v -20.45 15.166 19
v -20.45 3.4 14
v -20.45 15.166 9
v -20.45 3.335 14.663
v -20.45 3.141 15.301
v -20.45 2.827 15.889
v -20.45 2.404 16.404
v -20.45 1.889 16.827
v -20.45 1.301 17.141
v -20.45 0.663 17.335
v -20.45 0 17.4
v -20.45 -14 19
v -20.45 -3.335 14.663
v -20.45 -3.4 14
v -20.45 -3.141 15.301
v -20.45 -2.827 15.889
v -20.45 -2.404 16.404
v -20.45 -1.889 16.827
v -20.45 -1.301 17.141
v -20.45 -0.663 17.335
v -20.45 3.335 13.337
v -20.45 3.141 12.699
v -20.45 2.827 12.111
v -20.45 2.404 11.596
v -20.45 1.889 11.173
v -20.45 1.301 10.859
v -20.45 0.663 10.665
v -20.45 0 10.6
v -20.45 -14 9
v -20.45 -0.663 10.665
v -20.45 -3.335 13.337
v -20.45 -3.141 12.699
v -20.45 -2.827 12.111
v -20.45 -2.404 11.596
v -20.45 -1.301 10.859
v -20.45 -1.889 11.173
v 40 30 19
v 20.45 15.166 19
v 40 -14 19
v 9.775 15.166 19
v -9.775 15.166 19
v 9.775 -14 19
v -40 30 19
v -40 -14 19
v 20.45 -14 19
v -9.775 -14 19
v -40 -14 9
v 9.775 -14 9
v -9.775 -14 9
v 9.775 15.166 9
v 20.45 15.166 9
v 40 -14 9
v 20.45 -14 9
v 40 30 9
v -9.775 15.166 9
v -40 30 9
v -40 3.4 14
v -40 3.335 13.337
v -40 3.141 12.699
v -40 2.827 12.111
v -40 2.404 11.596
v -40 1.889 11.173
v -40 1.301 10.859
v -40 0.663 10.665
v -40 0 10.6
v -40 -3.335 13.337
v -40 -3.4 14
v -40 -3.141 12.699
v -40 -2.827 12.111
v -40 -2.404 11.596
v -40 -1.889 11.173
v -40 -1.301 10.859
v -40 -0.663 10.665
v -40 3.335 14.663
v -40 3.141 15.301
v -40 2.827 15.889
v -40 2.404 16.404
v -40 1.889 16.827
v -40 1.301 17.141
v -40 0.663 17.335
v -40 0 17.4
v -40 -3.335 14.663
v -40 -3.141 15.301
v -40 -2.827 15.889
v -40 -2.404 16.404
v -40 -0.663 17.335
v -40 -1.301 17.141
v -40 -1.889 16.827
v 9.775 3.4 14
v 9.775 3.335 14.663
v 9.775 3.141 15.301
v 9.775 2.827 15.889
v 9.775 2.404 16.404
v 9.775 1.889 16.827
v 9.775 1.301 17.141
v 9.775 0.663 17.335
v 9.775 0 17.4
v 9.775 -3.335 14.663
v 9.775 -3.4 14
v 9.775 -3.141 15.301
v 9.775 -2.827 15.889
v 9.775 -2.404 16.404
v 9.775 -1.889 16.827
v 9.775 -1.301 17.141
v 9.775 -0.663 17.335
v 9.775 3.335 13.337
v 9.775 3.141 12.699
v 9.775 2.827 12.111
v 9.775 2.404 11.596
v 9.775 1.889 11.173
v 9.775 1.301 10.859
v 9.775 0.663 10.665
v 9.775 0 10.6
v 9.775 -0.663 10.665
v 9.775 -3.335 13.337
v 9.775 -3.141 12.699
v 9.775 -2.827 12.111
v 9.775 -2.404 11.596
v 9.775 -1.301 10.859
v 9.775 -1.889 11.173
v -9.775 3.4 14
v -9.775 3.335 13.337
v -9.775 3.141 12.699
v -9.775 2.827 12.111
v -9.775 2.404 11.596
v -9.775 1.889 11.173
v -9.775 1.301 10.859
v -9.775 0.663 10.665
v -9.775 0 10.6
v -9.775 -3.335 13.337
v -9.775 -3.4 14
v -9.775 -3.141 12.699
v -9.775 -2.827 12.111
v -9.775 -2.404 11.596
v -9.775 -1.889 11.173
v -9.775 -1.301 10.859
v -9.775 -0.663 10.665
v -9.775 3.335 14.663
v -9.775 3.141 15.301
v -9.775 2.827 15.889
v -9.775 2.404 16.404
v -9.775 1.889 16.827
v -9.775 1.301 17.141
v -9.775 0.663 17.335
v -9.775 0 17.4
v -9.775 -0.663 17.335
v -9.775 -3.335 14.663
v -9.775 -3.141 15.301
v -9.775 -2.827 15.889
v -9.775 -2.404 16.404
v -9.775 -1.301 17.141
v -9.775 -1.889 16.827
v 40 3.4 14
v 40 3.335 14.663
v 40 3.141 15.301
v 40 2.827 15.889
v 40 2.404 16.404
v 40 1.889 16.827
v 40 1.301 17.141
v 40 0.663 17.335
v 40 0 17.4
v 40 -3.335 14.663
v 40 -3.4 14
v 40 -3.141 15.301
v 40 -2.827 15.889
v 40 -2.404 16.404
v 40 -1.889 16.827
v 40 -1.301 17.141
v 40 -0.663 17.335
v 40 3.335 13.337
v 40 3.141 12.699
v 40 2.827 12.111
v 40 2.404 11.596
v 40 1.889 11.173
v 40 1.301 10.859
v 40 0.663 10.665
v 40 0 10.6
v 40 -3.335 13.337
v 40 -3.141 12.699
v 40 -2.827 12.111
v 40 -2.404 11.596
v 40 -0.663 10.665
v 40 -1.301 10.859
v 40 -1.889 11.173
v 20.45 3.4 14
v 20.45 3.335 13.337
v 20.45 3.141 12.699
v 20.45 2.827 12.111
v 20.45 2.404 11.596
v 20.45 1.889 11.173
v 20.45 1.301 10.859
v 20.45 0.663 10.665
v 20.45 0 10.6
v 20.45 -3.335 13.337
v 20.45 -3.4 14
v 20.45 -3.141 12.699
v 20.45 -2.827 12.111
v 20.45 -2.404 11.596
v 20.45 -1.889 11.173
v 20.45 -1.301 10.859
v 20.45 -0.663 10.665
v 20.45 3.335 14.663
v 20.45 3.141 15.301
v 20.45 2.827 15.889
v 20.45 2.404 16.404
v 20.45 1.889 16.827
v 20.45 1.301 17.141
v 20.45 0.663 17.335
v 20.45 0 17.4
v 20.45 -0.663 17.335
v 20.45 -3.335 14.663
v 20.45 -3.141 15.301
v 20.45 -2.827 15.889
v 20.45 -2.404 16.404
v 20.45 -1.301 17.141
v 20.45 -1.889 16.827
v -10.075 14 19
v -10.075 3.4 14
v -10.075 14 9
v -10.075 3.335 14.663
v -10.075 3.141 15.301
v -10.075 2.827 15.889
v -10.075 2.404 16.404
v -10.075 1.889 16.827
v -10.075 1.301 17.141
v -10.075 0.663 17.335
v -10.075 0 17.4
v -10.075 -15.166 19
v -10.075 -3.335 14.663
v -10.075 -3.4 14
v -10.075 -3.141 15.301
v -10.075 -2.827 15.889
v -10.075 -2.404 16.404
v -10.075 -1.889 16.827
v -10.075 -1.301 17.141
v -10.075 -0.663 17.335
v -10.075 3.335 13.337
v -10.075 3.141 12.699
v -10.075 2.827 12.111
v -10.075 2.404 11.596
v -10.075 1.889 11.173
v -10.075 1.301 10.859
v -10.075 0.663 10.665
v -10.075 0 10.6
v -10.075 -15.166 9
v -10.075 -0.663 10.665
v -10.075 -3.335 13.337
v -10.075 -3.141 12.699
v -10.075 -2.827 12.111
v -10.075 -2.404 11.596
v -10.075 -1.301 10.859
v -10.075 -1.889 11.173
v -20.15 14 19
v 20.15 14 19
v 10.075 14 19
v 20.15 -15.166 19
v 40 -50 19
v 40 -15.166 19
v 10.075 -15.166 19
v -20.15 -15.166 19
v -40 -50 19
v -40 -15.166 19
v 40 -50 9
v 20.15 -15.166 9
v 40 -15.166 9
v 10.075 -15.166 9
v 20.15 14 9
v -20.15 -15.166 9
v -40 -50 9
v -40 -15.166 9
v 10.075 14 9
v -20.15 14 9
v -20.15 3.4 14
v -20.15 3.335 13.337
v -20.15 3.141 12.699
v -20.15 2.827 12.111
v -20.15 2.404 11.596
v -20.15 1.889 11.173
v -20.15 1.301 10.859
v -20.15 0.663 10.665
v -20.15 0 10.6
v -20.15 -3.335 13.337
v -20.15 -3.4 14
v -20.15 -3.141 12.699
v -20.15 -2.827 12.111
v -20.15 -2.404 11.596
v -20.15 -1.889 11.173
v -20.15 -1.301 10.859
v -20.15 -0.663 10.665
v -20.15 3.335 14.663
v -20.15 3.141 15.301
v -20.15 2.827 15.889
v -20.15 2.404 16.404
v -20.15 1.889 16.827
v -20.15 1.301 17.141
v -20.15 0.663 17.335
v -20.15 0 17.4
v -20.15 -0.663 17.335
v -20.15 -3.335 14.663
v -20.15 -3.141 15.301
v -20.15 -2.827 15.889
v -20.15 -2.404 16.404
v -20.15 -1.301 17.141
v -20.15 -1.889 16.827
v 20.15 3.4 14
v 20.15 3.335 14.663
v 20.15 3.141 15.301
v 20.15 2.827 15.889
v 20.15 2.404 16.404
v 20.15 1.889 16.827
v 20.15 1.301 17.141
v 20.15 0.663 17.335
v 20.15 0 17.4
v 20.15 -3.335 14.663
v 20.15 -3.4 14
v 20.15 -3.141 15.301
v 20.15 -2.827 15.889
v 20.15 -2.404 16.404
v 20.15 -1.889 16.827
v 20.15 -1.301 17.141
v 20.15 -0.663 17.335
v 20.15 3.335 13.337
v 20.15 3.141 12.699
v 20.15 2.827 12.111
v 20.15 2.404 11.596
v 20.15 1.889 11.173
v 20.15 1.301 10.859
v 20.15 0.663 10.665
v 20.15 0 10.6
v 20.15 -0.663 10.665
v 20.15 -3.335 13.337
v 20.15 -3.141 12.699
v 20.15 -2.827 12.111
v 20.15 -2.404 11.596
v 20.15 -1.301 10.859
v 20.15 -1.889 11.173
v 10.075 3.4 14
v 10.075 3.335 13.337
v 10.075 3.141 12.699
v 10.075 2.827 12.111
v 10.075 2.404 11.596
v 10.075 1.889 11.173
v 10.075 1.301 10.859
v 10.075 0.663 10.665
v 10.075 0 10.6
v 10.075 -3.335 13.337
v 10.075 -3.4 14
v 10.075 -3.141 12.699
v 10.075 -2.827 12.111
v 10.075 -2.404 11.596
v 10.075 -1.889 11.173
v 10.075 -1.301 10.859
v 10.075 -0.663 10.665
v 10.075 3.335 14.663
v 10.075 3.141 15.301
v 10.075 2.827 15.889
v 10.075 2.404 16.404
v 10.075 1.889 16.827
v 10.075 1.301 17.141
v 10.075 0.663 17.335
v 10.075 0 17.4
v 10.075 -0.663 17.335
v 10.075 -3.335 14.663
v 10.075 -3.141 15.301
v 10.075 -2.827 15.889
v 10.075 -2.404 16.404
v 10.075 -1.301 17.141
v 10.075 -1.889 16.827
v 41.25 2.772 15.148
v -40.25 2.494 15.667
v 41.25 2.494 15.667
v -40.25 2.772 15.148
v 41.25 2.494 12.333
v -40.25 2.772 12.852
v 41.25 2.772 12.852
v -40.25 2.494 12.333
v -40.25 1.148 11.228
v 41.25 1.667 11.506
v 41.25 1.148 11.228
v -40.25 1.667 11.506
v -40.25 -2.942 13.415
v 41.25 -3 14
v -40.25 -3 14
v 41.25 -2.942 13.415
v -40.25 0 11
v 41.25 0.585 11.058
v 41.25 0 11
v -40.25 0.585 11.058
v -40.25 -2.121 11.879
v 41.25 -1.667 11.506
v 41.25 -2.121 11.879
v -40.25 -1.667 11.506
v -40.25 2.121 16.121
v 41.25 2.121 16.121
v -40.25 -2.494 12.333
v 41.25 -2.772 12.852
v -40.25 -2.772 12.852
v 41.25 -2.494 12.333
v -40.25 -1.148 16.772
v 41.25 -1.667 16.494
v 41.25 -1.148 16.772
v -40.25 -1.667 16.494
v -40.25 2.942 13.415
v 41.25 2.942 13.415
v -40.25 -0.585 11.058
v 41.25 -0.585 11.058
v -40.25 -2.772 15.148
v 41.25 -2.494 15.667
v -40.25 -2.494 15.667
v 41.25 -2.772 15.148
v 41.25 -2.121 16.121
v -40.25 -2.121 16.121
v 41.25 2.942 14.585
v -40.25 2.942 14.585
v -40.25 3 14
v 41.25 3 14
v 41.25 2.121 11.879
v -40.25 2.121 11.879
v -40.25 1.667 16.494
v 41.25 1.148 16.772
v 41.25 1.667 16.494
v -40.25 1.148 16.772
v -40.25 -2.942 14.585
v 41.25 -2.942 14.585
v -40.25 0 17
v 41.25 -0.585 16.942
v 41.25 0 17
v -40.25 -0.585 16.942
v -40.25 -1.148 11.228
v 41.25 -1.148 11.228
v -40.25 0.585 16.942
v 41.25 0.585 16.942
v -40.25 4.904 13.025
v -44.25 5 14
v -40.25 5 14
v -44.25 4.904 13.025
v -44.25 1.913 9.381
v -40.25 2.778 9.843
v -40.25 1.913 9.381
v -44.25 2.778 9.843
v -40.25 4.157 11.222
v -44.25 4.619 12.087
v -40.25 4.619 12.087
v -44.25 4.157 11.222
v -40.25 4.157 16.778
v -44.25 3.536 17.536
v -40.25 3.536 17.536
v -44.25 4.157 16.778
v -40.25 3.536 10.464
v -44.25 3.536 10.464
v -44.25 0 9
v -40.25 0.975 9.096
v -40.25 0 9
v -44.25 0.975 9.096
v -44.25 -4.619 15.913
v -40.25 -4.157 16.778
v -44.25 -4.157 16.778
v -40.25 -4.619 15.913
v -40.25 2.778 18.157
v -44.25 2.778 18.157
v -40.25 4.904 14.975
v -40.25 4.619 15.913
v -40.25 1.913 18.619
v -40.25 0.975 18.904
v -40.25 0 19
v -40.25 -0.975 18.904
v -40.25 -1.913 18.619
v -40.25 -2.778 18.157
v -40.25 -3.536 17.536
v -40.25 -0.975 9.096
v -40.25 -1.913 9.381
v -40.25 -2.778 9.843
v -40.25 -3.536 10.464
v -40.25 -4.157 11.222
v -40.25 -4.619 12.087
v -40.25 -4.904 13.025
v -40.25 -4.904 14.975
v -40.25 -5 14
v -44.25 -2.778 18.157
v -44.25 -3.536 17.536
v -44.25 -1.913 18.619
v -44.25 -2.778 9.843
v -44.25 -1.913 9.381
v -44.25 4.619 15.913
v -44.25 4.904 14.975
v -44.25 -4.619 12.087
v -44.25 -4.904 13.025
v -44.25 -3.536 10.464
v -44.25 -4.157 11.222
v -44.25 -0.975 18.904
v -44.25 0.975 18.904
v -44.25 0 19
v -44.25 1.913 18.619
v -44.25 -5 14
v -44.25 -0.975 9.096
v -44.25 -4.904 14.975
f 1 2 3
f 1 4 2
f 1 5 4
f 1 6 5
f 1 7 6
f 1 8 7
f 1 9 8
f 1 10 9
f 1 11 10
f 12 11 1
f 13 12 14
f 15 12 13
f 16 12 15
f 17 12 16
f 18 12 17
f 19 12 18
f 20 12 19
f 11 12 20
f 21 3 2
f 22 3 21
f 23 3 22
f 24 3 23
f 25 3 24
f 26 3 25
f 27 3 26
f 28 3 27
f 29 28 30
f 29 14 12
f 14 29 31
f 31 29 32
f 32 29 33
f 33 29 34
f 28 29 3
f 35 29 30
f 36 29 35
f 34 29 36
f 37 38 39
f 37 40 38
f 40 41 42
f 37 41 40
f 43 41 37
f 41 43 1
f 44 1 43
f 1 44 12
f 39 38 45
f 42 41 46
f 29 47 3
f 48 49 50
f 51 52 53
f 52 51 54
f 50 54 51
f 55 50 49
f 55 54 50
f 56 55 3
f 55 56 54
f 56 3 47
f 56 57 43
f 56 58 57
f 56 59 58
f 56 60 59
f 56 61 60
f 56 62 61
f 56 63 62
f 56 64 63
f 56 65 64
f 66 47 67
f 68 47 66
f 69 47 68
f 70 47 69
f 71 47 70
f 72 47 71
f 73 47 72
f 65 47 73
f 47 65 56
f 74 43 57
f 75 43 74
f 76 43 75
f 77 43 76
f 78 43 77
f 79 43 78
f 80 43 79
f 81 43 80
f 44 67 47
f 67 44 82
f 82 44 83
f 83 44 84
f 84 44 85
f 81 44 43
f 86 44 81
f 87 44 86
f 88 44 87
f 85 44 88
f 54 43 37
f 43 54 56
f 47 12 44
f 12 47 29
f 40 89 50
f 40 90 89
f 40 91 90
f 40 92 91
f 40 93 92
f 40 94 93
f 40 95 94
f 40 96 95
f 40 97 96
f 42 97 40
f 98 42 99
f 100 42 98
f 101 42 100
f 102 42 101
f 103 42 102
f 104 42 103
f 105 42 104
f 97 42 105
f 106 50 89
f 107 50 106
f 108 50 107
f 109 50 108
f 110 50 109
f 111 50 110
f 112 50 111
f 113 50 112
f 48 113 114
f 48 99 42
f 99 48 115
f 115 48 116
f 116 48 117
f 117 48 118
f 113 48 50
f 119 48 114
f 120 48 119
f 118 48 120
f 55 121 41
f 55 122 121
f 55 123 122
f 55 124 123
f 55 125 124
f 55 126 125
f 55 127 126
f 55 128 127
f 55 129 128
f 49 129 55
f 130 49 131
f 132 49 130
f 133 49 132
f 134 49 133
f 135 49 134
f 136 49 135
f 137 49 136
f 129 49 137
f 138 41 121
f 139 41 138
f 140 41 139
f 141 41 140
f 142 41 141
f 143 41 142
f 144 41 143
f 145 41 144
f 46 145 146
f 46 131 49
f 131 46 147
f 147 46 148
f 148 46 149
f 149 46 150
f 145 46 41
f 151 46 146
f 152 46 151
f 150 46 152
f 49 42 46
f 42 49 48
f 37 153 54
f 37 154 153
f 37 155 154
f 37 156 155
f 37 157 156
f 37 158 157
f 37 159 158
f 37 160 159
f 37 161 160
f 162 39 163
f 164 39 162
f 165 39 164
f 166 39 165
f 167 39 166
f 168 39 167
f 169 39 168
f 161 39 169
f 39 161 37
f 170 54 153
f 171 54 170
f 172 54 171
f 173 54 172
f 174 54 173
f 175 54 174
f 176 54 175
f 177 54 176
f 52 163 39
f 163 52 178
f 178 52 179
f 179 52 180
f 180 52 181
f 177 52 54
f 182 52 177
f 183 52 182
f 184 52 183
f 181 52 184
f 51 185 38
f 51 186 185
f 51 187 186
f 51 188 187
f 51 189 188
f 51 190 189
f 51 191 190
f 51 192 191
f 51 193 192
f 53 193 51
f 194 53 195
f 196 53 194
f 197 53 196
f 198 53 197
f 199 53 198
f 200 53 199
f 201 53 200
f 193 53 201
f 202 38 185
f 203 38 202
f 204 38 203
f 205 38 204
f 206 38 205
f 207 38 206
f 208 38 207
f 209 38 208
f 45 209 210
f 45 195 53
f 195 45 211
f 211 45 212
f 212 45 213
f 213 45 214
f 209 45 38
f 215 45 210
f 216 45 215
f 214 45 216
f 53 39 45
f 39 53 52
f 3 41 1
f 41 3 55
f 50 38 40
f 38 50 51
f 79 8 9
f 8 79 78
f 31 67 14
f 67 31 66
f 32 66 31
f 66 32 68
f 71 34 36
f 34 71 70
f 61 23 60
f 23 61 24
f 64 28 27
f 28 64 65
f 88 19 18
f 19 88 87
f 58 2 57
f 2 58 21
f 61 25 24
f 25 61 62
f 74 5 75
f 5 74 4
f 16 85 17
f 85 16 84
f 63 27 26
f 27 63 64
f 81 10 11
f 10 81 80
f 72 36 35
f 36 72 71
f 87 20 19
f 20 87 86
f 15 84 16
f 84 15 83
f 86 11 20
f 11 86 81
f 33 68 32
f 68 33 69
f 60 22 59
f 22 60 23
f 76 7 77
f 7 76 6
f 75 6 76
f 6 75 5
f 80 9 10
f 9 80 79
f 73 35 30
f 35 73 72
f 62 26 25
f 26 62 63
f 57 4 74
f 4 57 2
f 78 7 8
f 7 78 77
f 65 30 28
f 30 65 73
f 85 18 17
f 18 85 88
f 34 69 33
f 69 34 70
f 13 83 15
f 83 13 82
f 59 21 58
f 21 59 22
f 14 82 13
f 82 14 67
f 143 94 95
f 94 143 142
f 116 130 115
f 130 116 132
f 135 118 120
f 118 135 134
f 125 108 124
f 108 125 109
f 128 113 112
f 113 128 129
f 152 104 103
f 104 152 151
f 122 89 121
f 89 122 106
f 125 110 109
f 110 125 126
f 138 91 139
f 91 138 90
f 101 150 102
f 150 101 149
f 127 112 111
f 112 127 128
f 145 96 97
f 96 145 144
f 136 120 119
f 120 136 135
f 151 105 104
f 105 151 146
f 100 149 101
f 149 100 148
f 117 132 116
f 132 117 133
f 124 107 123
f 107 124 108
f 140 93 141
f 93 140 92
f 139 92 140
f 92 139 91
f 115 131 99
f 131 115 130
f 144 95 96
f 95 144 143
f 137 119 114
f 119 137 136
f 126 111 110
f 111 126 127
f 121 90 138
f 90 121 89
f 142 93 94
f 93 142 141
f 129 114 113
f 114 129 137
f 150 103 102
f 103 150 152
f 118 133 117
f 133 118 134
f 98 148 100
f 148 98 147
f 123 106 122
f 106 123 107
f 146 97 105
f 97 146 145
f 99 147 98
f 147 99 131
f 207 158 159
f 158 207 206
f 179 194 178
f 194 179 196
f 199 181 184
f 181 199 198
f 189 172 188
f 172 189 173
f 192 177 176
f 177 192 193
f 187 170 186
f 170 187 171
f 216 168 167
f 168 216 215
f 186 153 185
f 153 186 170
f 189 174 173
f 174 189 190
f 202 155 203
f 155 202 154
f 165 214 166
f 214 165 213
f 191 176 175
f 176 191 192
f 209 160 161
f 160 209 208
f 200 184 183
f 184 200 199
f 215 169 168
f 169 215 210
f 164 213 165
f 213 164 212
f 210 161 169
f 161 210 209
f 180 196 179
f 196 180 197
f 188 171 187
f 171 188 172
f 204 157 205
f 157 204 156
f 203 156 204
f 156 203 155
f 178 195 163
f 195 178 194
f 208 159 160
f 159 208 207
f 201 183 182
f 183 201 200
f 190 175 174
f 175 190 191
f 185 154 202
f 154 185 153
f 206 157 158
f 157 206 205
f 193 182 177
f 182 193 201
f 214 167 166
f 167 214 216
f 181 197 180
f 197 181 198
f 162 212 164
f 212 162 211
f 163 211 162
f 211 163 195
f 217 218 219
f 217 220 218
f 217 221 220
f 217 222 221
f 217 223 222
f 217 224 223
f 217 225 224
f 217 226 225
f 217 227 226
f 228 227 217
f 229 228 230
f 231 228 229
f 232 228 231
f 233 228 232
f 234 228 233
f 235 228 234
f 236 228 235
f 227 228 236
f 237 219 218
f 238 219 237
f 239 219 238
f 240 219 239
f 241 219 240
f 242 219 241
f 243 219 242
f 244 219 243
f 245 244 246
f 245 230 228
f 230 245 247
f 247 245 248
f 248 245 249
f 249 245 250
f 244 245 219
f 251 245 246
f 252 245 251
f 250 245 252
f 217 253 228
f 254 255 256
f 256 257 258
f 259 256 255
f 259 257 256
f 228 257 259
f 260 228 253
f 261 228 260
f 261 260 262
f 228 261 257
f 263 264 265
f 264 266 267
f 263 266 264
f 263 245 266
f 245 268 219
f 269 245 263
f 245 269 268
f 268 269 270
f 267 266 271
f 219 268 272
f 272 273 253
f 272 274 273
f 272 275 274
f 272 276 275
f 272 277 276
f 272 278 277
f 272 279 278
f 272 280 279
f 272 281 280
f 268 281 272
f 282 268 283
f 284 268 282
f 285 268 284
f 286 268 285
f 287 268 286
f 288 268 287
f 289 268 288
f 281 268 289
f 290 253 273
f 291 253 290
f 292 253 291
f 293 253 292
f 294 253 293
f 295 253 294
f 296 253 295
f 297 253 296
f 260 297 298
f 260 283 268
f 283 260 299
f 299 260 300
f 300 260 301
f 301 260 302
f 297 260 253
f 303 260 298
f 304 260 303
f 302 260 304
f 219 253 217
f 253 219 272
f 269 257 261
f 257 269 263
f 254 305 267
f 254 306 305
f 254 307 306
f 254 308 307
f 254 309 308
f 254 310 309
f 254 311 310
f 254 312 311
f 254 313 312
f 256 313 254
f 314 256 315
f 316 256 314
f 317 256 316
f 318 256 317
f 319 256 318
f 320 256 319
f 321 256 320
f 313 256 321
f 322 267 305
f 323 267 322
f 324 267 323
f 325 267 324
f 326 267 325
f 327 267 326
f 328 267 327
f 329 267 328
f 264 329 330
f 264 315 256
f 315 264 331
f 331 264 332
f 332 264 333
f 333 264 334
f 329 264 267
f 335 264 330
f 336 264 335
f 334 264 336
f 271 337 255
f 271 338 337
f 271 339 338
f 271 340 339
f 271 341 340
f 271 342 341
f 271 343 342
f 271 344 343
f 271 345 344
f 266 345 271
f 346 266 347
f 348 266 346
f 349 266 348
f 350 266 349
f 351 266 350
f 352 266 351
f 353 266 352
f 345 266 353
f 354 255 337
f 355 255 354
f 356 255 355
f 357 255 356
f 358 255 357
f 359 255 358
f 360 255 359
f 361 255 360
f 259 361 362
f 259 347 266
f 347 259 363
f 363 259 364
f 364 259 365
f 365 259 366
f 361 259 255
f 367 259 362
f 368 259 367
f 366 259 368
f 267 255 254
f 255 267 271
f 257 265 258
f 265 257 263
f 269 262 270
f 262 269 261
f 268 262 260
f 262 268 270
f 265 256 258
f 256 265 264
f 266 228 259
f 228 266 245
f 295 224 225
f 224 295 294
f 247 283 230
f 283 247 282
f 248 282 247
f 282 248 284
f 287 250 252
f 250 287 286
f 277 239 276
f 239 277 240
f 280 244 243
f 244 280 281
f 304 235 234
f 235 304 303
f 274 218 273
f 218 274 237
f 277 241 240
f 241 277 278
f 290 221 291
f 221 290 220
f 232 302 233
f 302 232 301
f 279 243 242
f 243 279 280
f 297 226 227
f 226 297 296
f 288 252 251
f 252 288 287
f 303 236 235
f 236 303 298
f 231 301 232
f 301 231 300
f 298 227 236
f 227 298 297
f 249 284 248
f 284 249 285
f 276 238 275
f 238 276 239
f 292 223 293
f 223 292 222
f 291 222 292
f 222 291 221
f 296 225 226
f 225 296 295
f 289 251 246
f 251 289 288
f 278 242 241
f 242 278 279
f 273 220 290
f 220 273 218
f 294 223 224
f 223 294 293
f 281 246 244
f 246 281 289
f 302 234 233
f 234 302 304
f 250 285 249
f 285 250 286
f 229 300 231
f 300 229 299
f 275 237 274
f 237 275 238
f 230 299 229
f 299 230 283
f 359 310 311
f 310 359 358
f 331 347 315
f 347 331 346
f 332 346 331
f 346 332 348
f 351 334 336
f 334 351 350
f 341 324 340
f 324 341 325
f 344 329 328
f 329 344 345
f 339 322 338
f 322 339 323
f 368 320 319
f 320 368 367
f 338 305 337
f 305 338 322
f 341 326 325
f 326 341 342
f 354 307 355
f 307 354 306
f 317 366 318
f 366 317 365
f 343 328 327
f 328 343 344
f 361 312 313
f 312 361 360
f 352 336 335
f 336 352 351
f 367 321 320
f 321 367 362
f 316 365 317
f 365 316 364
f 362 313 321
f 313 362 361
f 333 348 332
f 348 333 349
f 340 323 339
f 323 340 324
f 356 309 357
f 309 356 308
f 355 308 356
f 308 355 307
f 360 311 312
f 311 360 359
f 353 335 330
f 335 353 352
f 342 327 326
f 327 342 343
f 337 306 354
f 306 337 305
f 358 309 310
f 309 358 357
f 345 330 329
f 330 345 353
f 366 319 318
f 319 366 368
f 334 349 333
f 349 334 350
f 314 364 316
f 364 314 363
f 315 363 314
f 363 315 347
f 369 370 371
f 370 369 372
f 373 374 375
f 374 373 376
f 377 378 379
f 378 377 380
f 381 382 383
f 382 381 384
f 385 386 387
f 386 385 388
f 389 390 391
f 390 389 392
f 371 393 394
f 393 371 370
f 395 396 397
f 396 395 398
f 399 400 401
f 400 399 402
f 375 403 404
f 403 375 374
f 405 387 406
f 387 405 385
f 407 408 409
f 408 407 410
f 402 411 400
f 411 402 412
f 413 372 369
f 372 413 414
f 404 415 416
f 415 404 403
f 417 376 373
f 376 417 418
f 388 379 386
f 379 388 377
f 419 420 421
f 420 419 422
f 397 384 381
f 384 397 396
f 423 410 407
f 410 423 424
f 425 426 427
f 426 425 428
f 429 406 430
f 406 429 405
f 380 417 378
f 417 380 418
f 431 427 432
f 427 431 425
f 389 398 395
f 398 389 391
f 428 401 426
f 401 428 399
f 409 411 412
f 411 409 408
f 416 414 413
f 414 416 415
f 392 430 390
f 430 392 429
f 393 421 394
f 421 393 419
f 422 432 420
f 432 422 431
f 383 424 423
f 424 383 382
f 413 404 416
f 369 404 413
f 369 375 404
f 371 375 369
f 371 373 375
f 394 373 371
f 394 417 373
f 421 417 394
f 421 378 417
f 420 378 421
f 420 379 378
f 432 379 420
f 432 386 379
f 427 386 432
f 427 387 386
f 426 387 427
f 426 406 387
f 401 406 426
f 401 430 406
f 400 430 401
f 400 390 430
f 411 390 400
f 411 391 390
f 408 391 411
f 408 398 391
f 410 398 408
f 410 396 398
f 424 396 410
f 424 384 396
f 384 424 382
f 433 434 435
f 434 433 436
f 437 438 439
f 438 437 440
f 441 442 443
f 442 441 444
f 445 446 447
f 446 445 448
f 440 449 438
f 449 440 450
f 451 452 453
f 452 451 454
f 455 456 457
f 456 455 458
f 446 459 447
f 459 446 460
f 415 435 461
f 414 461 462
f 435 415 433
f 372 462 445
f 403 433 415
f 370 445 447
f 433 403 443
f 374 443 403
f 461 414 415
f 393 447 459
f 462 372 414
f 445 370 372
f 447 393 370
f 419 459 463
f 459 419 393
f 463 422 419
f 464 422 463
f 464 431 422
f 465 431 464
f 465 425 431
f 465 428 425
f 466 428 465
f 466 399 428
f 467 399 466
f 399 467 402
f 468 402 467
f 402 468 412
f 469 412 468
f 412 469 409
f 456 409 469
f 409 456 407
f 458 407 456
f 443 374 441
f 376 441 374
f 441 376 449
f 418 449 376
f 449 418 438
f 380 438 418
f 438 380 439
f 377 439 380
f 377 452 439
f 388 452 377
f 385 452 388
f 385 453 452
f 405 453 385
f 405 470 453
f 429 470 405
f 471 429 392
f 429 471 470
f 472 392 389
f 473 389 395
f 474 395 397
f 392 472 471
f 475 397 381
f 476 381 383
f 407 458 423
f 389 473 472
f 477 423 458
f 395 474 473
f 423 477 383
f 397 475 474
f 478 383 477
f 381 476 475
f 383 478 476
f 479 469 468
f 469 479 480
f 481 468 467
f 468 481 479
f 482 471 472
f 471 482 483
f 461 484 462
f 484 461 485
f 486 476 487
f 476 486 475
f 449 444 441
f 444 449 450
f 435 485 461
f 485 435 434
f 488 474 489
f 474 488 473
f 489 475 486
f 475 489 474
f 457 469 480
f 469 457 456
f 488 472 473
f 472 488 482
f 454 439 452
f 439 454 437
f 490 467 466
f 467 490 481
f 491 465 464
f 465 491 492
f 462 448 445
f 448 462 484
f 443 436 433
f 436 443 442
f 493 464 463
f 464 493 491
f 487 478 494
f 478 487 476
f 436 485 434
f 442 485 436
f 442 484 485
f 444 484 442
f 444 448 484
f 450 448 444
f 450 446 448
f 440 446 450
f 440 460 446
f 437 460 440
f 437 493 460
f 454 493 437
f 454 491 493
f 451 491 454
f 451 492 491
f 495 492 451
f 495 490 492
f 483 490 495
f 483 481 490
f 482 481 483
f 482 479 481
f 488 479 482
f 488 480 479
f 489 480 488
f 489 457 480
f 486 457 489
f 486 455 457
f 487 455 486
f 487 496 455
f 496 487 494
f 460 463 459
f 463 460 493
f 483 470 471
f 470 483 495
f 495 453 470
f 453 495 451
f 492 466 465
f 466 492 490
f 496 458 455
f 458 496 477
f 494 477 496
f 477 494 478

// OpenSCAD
$fn = 32;

// ------------------------------------------------------------------------
// Butt hinge: hinge 80 mm, leaf swung 0 deg
// Every part is its own module, assembly() places every instance.
// ------------------------------------------------------------------------

// --- part 1 ---
module hinge_base() {
  difference() {
    union() {
      translate([-40, -14, -5]) cube([19.55, 44, 10]);
      translate([-9.775, -14, -5]) cube([19.55, 44, 10]);
      translate([20.45, -14, -5]) cube([19.55, 44, 10]);
      translate([-40, 15.166, -5]) cube([80, 14.834, 10]);
    }
    translate([-30.225, 0, 0]) rotate([0, 90, 0]) cylinder(h = 21.55, d = 6.8, center = true);
    translate([0, 0, 0]) rotate([0, 90, 0]) cylinder(h = 21.55, d = 6.8, center = true);
    translate([30.225, 0, 0]) rotate([0, 90, 0]) cylinder(h = 21.55, d = 6.8, center = true);
  }
}

// --- part 2 ---
module hinge_mover() {
  difference() {
    union() {
      translate([-20.15, -50, -5]) cube([10.075, 64, 10]);
      translate([10.075, -50, -5]) cube([10.075, 64, 10]);
      translate([-40, -50, -5]) cube([80, 34.834, 10]);
    }
    translate([-15.113, 0, 0]) rotate([0, 90, 0]) cylinder(h = 12.075, d = 6.8, center = true);
    translate([15.113, 0, 0]) rotate([0, 90, 0]) cylinder(h = 12.075, d = 6.8, center = true);
  }
}

// --- part 3 ---
module hinge_pin() {
  rotate([0, 90, 0]) cylinder(h = 82.5, d = 6, center = true);
  translate([-44.25, 0, 0]) rotate([0, 90, 0]) cylinder(h = 4, d = 10);
}

// --- assembly ---
module assembly() {
  color([0.80, 0.24, 0.20]) translate([0, 0, 14]) rotate([0, 0, 0]) hinge_base();
  color([0.20, 0.45, 0.75]) translate([0, 0, 14]) rotate([0, 0, 0]) hinge_mover();
  color([0.25, 0.62, 0.32]) translate([0, 0, 14]) rotate([0, 0, 0]) hinge_pin();
}

assembly();
